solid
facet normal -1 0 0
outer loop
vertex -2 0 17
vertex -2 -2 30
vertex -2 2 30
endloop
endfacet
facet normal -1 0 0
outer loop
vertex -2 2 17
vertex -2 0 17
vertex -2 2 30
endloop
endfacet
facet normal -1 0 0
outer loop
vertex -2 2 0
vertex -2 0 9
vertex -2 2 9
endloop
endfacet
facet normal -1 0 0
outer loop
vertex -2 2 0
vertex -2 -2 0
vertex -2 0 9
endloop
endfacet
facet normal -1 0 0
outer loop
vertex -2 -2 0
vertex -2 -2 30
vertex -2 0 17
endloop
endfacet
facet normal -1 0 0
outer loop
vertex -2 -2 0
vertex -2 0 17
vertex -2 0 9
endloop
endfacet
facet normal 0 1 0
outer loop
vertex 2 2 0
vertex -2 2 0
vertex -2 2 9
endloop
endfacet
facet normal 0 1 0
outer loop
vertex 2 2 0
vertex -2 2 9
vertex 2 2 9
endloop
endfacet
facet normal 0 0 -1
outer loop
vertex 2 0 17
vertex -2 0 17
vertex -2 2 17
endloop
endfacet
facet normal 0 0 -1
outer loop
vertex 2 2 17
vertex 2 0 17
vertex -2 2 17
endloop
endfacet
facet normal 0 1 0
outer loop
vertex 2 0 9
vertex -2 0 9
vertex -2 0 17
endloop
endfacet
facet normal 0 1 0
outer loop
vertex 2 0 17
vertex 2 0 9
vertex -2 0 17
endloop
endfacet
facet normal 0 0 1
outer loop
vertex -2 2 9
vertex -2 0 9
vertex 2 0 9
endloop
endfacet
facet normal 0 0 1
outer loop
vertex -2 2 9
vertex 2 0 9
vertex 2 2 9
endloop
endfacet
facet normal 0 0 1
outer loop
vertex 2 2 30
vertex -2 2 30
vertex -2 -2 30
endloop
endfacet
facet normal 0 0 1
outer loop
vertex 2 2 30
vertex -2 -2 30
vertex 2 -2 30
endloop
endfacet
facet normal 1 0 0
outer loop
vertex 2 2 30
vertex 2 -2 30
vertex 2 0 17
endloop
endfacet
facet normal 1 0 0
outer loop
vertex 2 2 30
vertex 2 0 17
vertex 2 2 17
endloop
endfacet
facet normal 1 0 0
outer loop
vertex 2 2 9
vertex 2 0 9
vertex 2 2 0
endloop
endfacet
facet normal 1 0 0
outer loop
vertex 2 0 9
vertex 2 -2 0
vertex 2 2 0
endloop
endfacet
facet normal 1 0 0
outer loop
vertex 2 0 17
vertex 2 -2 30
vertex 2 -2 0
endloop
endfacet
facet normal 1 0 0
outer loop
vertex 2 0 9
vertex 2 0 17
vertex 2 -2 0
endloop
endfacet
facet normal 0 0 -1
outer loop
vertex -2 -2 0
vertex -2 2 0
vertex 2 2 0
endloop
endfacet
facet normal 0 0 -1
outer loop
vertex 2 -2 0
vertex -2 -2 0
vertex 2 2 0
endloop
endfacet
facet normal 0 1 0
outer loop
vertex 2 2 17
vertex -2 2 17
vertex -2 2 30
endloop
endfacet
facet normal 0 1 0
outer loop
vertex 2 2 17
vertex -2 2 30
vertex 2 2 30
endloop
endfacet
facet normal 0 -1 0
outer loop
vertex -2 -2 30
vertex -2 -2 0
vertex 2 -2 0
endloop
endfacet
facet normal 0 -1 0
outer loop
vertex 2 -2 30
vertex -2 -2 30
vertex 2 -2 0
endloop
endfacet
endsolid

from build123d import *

# Parameters (mm, degrees)
SKETCH_1_W          = 4
SKETCH_1_H          = 4
EXTRUDE_1_DEPTH     = 30
SKETCH_4_W          = 8
SKETCH_4_H          = 2
CUT_EXTRUDE_1_DEPTH = 4


with BuildPart() as part:
    # 草圖1 → 填料-伸長1 (new body)
    with BuildSketch(Plane.XY):
        Rectangle(SKETCH_1_W, SKETCH_1_H)
    extrude(amount=EXTRUDE_1_DEPTH)

    # 草圖4 → 除料-伸長1 (cut)
    with BuildSketch(Plane.ZY.offset(2)):
        with Locations((13, 1)):
            Rectangle(SKETCH_4_W, SKETCH_4_H)
    extrude(amount=-CUT_EXTRUDE_1_DEPTH, mode=Mode.SUBTRACT)


solid = part.part
